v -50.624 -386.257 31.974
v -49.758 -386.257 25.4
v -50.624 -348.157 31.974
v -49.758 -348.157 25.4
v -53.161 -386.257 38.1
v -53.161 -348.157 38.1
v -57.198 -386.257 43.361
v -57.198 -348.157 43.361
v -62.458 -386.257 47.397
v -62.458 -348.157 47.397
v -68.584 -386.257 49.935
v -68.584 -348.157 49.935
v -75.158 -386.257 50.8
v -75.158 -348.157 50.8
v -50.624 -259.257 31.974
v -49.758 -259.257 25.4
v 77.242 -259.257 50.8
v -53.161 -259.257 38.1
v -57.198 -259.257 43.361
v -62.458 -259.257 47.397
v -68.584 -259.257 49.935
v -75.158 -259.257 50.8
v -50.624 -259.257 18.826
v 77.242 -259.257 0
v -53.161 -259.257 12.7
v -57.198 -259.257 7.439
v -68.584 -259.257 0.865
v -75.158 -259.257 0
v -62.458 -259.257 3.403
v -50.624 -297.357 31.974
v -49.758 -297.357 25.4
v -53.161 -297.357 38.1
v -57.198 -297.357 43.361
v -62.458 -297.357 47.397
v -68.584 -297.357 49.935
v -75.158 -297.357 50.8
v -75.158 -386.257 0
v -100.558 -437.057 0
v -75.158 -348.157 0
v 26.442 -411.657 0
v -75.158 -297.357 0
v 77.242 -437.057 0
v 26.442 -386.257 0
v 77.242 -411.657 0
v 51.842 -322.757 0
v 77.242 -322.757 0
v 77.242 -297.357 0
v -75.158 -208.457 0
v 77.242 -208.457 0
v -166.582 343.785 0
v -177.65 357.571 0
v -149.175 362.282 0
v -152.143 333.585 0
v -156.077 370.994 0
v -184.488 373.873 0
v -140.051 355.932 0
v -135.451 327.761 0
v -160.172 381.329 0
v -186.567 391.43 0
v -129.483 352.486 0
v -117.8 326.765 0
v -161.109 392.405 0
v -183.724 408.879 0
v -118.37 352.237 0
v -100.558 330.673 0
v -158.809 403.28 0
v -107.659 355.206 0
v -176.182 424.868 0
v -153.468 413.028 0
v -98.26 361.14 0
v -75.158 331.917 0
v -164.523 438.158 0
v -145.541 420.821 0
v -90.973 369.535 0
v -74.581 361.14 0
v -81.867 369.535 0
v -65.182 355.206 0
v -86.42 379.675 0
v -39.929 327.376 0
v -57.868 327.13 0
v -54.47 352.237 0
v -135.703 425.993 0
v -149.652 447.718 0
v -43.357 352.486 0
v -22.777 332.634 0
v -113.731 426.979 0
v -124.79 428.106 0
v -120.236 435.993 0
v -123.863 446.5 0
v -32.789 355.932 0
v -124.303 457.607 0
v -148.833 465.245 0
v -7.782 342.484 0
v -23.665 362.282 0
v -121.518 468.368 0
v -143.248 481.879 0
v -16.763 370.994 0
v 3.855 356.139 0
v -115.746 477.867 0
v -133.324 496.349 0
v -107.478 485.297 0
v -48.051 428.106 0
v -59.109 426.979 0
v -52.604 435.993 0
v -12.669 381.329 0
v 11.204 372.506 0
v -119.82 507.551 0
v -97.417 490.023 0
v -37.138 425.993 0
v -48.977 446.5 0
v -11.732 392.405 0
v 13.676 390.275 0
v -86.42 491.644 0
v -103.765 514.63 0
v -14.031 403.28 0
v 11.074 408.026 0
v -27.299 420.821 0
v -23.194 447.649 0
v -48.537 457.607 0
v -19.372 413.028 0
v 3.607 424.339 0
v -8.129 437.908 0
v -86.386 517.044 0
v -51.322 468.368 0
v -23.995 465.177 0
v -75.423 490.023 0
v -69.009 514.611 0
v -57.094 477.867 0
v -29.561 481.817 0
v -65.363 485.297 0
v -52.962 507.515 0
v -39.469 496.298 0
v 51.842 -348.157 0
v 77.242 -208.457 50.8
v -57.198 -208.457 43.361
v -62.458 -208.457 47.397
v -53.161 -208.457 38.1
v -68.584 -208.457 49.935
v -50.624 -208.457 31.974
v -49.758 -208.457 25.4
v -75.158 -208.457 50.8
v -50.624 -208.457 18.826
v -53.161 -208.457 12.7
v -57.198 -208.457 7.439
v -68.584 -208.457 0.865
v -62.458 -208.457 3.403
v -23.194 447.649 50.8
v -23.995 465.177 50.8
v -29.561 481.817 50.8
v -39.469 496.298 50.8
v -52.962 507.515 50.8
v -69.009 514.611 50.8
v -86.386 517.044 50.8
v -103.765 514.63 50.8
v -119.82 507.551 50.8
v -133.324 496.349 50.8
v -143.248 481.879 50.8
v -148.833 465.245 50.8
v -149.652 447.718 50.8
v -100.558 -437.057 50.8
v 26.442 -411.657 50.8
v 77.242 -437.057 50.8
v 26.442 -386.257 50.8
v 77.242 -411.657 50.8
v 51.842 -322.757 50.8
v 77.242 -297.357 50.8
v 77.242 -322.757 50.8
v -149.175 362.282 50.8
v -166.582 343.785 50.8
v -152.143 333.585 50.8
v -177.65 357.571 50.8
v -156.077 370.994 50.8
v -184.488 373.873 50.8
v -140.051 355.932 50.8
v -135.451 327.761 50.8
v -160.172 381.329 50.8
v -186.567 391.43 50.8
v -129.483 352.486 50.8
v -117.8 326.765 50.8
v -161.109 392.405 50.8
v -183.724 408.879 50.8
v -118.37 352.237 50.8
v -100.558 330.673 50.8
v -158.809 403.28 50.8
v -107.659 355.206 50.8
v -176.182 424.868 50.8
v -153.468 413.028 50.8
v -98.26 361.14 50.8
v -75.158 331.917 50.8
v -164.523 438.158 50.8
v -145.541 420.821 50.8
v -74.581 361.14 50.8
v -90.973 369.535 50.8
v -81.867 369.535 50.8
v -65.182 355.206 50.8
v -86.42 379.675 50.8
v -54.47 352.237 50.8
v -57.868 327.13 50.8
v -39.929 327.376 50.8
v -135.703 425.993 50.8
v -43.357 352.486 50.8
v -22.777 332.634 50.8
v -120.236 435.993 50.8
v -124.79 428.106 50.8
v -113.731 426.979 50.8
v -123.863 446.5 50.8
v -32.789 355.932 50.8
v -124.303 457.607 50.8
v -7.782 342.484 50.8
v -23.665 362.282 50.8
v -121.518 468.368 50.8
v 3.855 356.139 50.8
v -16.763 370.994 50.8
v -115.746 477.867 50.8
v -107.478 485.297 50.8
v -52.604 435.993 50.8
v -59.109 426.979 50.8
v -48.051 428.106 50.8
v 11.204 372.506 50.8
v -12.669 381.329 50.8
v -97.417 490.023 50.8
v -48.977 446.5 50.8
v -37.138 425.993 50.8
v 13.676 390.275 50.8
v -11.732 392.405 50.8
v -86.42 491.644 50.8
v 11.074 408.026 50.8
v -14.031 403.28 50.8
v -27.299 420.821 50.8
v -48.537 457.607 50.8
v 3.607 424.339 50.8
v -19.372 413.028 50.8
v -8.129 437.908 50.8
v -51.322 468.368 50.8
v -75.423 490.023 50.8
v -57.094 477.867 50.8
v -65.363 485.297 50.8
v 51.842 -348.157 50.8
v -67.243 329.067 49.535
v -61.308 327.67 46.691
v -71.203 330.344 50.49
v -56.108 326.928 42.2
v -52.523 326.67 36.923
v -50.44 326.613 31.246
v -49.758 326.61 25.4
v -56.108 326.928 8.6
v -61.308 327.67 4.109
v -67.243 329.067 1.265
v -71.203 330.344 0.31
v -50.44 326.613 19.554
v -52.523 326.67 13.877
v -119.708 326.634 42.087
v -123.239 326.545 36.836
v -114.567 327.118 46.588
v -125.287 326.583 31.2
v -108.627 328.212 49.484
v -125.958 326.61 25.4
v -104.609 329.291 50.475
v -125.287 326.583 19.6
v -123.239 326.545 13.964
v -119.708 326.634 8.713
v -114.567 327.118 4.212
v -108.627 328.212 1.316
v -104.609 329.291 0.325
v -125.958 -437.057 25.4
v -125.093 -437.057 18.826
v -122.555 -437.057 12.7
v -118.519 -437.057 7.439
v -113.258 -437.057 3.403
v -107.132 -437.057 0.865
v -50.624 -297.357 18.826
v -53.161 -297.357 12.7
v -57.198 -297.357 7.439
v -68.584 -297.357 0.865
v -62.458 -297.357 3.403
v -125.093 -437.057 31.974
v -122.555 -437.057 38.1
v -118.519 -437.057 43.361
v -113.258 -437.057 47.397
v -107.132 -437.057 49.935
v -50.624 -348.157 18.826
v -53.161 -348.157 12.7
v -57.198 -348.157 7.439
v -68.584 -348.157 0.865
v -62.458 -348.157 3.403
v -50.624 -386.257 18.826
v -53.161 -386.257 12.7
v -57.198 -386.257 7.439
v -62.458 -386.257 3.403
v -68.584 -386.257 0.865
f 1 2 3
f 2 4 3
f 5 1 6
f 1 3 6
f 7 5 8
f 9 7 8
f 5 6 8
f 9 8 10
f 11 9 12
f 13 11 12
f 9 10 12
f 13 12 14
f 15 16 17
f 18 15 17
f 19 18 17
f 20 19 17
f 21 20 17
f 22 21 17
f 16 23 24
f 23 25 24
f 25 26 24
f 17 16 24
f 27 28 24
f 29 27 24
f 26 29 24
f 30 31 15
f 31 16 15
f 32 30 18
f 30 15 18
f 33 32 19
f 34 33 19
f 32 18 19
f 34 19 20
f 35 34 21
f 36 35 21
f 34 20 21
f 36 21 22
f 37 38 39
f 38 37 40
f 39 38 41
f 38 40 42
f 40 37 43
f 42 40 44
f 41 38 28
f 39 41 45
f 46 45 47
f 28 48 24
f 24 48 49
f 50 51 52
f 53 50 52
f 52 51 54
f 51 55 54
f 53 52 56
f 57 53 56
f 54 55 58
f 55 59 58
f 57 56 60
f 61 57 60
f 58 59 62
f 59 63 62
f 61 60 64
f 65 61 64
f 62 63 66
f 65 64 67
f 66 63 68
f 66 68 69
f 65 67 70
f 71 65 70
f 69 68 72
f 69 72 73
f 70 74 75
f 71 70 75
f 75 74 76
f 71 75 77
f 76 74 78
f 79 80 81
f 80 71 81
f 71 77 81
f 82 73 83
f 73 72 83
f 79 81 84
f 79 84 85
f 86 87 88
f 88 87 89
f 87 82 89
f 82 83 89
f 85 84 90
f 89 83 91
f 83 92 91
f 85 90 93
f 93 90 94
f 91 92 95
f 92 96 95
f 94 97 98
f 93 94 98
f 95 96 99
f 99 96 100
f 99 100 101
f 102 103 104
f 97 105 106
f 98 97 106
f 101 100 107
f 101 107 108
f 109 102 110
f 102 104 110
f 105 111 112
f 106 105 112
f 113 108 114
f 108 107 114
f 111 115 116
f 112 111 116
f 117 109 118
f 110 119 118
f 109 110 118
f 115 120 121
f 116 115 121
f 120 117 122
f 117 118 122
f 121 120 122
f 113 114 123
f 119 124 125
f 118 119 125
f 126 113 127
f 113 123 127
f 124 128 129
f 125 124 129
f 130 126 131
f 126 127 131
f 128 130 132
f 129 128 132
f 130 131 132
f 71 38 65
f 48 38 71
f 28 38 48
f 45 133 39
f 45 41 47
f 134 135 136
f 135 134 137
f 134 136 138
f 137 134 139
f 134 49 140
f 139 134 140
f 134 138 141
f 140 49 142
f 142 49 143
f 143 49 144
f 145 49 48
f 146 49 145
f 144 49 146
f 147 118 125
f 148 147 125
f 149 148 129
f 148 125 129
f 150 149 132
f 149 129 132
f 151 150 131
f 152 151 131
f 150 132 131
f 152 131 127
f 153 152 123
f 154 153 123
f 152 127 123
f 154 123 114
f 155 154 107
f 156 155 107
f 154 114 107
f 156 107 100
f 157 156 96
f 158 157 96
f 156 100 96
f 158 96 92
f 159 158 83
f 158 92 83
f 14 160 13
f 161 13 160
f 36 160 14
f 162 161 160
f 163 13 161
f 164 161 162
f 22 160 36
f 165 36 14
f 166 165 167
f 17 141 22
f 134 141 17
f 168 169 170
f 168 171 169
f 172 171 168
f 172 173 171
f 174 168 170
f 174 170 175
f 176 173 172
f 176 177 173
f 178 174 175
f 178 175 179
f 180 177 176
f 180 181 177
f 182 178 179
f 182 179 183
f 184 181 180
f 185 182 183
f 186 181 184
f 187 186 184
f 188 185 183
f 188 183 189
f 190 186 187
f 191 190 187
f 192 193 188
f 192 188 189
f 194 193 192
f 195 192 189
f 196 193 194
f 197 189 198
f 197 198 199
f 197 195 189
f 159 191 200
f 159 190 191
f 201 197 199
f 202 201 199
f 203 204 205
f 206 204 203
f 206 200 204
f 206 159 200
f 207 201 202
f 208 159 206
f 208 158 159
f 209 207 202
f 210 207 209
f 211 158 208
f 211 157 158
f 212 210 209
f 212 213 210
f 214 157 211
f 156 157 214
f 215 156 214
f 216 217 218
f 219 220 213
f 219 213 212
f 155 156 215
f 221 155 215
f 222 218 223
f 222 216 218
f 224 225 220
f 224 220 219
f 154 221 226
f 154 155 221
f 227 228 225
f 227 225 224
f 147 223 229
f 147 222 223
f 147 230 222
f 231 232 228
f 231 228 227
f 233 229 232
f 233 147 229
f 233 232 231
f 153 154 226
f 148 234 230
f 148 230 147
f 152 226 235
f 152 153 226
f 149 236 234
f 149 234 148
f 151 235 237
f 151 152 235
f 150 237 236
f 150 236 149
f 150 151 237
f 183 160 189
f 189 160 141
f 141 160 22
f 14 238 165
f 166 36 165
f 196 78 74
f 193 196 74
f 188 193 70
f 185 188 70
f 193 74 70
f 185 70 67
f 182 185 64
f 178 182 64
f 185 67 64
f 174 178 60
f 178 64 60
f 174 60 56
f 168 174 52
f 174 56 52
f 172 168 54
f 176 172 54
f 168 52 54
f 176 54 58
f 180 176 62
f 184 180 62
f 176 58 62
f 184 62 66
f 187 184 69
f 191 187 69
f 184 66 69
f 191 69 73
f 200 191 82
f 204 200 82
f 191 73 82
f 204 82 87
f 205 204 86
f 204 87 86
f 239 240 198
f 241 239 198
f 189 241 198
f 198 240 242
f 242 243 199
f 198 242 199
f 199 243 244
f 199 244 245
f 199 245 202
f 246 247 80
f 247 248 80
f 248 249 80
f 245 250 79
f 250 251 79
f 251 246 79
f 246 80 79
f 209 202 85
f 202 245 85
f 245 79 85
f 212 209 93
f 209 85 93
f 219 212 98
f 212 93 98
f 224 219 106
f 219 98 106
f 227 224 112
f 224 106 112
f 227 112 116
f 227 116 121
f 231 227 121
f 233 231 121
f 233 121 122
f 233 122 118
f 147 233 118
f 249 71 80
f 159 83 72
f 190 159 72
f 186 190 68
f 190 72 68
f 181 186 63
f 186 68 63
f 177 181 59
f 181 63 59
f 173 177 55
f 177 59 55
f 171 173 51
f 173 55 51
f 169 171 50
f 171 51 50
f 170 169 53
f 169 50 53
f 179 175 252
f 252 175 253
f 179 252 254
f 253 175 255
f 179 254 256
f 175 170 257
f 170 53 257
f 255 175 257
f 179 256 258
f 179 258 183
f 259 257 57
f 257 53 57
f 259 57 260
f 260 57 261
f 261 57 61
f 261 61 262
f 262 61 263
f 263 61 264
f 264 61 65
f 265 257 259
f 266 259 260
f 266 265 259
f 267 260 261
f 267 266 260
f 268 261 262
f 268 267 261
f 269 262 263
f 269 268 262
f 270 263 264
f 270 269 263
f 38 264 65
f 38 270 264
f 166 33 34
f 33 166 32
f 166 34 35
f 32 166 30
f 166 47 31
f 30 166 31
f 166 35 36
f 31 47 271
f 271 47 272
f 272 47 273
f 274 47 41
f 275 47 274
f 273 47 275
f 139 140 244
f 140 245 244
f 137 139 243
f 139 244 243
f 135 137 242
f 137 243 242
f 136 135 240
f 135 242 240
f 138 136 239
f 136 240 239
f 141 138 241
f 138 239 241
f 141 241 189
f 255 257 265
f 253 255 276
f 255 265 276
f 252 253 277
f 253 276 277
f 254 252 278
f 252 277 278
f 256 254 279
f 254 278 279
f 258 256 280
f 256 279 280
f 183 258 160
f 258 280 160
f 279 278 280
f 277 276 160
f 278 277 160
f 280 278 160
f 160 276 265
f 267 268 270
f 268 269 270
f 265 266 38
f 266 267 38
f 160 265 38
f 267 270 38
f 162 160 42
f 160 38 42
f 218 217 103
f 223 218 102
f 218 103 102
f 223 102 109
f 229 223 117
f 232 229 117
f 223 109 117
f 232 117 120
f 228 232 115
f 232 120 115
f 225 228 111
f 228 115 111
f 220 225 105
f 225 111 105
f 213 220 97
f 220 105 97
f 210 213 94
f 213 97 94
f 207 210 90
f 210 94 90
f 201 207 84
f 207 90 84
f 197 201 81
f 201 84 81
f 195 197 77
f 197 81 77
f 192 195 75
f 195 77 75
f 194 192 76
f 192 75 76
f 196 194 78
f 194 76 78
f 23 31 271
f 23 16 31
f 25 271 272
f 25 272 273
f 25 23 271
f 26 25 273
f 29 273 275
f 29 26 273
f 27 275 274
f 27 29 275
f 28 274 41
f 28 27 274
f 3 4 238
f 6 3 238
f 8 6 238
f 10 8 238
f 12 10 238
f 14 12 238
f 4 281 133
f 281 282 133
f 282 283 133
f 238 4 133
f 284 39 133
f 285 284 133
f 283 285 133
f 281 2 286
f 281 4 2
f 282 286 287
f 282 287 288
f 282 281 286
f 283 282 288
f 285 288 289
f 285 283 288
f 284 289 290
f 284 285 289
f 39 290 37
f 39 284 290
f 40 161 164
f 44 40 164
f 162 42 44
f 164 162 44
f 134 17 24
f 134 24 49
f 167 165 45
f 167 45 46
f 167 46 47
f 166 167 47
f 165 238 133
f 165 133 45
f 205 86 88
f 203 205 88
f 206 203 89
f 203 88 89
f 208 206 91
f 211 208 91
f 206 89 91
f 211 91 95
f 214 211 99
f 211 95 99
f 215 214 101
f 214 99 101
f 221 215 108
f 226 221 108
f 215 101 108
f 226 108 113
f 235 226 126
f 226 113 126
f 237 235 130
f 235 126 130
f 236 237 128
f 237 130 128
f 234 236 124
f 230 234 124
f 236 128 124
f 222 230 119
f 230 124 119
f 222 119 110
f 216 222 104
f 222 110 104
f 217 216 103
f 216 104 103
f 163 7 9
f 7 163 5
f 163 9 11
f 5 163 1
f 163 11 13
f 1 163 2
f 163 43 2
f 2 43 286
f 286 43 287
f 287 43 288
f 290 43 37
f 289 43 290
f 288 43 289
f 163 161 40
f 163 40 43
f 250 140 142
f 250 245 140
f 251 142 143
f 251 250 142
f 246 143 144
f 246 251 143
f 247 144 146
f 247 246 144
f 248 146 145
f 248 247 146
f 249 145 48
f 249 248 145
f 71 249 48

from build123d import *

# Parameters (mm, degrees)
F1_DEPTH = 50.8
F2_R     = 25.39999
F4_W     = 61.8233563619
F4_H     = 42.2021473569
F4_W_2   = 44.7444434271
F4_H_2   = 31.3514119965
F5_DEPTH = 50.8


# Not quite as in the source:
# - a fillet or chamfer is up to 0.001 mm smaller than in the source, because OpenCascade refuses the exact size


with BuildPart() as f1:
    # F0 (on Top) → F1 (new body)
    with BuildSketch(Plane.XY):
        with BuildLine():
            Line((-125.9584231198, 326.6096413136), (-125.9584231198, -437.0573322225))
            Line((-125.9584231198, -437.0573322225), (-49.7584231198, -437.0573322225))
            Line((-49.7584231198, -437.0573322225), (77.2415768802, -437.0573322225))
            Line((77.2415768802, -437.0573322225), (77.2415768802, -386.2573322225))
            Line((77.2415768802, -386.2573322225), (-49.7584231198, -386.2573322225))
            Line((-49.7584231198, -386.2573322225), (-49.7584231198, -348.1573322225))
            Line((-49.7584231198, -348.1573322225), (77.2415768802, -348.1573322225))
            Line((77.2415768802, -348.1573322225), (77.2415768802, -297.3573322225))
            Line((77.2415768802, -297.3573322225), (-49.7584231198, -297.3573322225))
            Line((-49.7584231198, -297.3573322225), (-49.7584231198, -259.2573322225))
            Line((-49.7584231198, -259.2573322225), (77.2415768802, -259.2573322225))
            Line((77.2415768802, -259.2573322225), (77.2415768802, -208.4573322225))
            Line((77.2415768802, -208.4573322225), (-49.7584231198, -208.4573322225))
            Line((-49.7584231198, -208.4573322225), (-49.7584231198, 326.6096413136))
            ThreePointArc((-49.7584231198, 326.6096413136), (12.201780711, 376.4463381022), (-23.1943939269, 447.6493859763))
            ThreePointArc((-23.1943939269, 447.6493859763), (-86.3855996742, 517.0444461389), (-149.6523168654, 447.718221991))
            ThreePointArc((-149.6523168654, 447.718221991), (-185.4004633868, 377.8523446501), (-125.9584231198, 326.6096413136))
        make_face()
        with BuildLine():
            ThreePointArc((-86.4201652133, 379.6749489688), (-156.0774751911, 370.9944555466), (-113.7312923812, 426.9792088355))
            ThreePointArc((-113.7312923812, 426.9792088355), (-86.4201652133, 491.6444555466), (-59.1090380455, 426.9792088355))
            ThreePointArc((-59.1090380455, 426.9792088355), (-16.7628552356, 370.9944555466), (-86.4201652133, 379.6749489688))
        make_face(mode=Mode.SUBTRACT)
    extrude(amount=F1_DEPTH)

    # F2 (radius 25.4 in the source; OpenCascade refuses exactly that, so slightly less here)
    f2_edges = [f1.edges().sort_by_distance(p)[0] for p in [
        (-125.958423, -55.223845, 50.8),
        (-49.758423, 59.076155, 50.8),
        (-49.758423, 59.076155, 0),
        (-125.958423, -55.223845, 0),
        (-49.758423, -278.307332, 0),
        (-49.758423, -367.207332, 0),
        (-49.758423, -367.207332, 50.8),
        (-49.758423, -278.307332, 50.8),
    ]]
    fillet(f2_edges, radius=F2_R)

    # F4 (on face) → F5 (cut)
    with BuildSketch(Plane.XY.offset(50.8)):
        with Locations((57.3532550612, -390.556258544)):
            Rectangle(F4_W, F4_H)
        with Locations((74.2137985938, -338.4330382207)):
            Rectangle(F4_W_2, F4_H_2)
    extrude(amount=-F5_DEPTH, mode=Mode.SUBTRACT)


solid = f1.part
